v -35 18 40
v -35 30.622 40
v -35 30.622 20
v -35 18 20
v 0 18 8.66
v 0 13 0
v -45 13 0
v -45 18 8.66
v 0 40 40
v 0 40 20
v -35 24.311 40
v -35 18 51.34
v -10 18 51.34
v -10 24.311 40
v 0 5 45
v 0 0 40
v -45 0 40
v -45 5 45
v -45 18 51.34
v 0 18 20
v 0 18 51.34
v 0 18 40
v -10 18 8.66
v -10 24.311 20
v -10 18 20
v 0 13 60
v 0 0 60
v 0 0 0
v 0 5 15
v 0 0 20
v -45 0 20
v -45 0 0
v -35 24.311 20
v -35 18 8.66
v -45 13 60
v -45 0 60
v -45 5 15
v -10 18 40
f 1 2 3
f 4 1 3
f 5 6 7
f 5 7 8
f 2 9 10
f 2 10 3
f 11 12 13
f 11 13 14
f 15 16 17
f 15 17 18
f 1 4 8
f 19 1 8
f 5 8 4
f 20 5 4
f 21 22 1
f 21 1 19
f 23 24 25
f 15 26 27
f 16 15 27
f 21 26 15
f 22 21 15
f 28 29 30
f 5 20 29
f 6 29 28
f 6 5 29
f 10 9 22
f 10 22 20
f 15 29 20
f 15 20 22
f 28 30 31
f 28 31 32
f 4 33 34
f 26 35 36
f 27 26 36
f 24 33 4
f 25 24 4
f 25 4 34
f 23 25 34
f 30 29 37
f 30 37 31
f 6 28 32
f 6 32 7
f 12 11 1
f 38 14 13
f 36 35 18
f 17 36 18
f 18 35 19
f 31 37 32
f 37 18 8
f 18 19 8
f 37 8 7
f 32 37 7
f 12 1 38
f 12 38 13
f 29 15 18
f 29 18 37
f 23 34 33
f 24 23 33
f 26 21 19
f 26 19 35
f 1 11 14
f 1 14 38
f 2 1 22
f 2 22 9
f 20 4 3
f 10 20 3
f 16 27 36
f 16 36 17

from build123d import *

# Parameters (mm, degrees)
RESSALTO_EXTRUS_O1_DEPTH   = 45
ESBO_O2_W                  = 20
ESBO_O2_H                  = 22
RESSALTO_EXTRUS_O2_DEPTH   = 35
CORTE_EXTRUS_O1_REACH      = 74.284
RESSALTO_EXTRUS_O3_DEPTH   = 25
RESSALTO_EXTRUS_O3_2_DEPTH = 25


with BuildPart() as part:
    # Esboço1 → Ressalto-extrusão1 (new body)
    with BuildSketch(Plane(origin=(0, 0, 0), x_dir=(0, 0, -1), z_dir=(1, 0, 0))):
        Polygon((-40, 0), (-45, 5), (-15, 5), (-20, 0), (0, 0), (0, 13), (-8.660254038, 18), (-51.339745962, 18), (-60, 13), (-60, 0), align=None)
    extrude(amount=-RESSALTO_EXTRUS_O1_DEPTH)

    # Esboço2 → Ressalto-extrusão2 (add)
    with BuildSketch(Plane(origin=(0, 0, 0), x_dir=(0, 0, -1), z_dir=(1, 0, 0))):
        with Locations((-30, 29)):
            Rectangle(ESBO_O2_W, ESBO_O2_H)
    extrude(amount=-RESSALTO_EXTRUS_O2_DEPTH)

    # Esboço3 → Corte-extrusão1 (cut, up to next)
    with BuildSketch(Plane.XY.offset(40), mode=Mode.PRIVATE) as corte_extrus_o1_sk1:
        Polygon((0, 40), (-35, 30.621778265), (-35, 40), align=None)
    corte_extrus_o1_tool1 = extrude(corte_extrus_o1_sk1.sketch, amount=-CORTE_EXTRUS_O1_REACH, mode=Mode.PRIVATE) & part.part
    add(corte_extrus_o1_tool1.solids().sort_by_distance((-23.333333, 36.873926, 40))[0], mode=Mode.SUBTRACT)


with BuildPart() as body_2:
    # Esboço4 → Ressalto-extrusão3 (new body)
    with BuildSketch(Plane.ZY.offset(35)):
        Polygon((8.660254038, 18), (20, 24.310889132), (20, 18), align=None)
    extrude(amount=-RESSALTO_EXTRUS_O3_DEPTH)


with BuildPart() as body_3:
    # Esboço4 → Ressalto-extrus_o3 2 (new body)
    with BuildSketch(Plane.ZY.offset(35)):
        Polygon((51.339745962, 18), (40, 24.310889132), (40, 18), align=None)
    extrude(amount=-RESSALTO_EXTRUS_O3_2_DEPTH)


solid = Compound([part.part, body_2.part, body_3.part])
